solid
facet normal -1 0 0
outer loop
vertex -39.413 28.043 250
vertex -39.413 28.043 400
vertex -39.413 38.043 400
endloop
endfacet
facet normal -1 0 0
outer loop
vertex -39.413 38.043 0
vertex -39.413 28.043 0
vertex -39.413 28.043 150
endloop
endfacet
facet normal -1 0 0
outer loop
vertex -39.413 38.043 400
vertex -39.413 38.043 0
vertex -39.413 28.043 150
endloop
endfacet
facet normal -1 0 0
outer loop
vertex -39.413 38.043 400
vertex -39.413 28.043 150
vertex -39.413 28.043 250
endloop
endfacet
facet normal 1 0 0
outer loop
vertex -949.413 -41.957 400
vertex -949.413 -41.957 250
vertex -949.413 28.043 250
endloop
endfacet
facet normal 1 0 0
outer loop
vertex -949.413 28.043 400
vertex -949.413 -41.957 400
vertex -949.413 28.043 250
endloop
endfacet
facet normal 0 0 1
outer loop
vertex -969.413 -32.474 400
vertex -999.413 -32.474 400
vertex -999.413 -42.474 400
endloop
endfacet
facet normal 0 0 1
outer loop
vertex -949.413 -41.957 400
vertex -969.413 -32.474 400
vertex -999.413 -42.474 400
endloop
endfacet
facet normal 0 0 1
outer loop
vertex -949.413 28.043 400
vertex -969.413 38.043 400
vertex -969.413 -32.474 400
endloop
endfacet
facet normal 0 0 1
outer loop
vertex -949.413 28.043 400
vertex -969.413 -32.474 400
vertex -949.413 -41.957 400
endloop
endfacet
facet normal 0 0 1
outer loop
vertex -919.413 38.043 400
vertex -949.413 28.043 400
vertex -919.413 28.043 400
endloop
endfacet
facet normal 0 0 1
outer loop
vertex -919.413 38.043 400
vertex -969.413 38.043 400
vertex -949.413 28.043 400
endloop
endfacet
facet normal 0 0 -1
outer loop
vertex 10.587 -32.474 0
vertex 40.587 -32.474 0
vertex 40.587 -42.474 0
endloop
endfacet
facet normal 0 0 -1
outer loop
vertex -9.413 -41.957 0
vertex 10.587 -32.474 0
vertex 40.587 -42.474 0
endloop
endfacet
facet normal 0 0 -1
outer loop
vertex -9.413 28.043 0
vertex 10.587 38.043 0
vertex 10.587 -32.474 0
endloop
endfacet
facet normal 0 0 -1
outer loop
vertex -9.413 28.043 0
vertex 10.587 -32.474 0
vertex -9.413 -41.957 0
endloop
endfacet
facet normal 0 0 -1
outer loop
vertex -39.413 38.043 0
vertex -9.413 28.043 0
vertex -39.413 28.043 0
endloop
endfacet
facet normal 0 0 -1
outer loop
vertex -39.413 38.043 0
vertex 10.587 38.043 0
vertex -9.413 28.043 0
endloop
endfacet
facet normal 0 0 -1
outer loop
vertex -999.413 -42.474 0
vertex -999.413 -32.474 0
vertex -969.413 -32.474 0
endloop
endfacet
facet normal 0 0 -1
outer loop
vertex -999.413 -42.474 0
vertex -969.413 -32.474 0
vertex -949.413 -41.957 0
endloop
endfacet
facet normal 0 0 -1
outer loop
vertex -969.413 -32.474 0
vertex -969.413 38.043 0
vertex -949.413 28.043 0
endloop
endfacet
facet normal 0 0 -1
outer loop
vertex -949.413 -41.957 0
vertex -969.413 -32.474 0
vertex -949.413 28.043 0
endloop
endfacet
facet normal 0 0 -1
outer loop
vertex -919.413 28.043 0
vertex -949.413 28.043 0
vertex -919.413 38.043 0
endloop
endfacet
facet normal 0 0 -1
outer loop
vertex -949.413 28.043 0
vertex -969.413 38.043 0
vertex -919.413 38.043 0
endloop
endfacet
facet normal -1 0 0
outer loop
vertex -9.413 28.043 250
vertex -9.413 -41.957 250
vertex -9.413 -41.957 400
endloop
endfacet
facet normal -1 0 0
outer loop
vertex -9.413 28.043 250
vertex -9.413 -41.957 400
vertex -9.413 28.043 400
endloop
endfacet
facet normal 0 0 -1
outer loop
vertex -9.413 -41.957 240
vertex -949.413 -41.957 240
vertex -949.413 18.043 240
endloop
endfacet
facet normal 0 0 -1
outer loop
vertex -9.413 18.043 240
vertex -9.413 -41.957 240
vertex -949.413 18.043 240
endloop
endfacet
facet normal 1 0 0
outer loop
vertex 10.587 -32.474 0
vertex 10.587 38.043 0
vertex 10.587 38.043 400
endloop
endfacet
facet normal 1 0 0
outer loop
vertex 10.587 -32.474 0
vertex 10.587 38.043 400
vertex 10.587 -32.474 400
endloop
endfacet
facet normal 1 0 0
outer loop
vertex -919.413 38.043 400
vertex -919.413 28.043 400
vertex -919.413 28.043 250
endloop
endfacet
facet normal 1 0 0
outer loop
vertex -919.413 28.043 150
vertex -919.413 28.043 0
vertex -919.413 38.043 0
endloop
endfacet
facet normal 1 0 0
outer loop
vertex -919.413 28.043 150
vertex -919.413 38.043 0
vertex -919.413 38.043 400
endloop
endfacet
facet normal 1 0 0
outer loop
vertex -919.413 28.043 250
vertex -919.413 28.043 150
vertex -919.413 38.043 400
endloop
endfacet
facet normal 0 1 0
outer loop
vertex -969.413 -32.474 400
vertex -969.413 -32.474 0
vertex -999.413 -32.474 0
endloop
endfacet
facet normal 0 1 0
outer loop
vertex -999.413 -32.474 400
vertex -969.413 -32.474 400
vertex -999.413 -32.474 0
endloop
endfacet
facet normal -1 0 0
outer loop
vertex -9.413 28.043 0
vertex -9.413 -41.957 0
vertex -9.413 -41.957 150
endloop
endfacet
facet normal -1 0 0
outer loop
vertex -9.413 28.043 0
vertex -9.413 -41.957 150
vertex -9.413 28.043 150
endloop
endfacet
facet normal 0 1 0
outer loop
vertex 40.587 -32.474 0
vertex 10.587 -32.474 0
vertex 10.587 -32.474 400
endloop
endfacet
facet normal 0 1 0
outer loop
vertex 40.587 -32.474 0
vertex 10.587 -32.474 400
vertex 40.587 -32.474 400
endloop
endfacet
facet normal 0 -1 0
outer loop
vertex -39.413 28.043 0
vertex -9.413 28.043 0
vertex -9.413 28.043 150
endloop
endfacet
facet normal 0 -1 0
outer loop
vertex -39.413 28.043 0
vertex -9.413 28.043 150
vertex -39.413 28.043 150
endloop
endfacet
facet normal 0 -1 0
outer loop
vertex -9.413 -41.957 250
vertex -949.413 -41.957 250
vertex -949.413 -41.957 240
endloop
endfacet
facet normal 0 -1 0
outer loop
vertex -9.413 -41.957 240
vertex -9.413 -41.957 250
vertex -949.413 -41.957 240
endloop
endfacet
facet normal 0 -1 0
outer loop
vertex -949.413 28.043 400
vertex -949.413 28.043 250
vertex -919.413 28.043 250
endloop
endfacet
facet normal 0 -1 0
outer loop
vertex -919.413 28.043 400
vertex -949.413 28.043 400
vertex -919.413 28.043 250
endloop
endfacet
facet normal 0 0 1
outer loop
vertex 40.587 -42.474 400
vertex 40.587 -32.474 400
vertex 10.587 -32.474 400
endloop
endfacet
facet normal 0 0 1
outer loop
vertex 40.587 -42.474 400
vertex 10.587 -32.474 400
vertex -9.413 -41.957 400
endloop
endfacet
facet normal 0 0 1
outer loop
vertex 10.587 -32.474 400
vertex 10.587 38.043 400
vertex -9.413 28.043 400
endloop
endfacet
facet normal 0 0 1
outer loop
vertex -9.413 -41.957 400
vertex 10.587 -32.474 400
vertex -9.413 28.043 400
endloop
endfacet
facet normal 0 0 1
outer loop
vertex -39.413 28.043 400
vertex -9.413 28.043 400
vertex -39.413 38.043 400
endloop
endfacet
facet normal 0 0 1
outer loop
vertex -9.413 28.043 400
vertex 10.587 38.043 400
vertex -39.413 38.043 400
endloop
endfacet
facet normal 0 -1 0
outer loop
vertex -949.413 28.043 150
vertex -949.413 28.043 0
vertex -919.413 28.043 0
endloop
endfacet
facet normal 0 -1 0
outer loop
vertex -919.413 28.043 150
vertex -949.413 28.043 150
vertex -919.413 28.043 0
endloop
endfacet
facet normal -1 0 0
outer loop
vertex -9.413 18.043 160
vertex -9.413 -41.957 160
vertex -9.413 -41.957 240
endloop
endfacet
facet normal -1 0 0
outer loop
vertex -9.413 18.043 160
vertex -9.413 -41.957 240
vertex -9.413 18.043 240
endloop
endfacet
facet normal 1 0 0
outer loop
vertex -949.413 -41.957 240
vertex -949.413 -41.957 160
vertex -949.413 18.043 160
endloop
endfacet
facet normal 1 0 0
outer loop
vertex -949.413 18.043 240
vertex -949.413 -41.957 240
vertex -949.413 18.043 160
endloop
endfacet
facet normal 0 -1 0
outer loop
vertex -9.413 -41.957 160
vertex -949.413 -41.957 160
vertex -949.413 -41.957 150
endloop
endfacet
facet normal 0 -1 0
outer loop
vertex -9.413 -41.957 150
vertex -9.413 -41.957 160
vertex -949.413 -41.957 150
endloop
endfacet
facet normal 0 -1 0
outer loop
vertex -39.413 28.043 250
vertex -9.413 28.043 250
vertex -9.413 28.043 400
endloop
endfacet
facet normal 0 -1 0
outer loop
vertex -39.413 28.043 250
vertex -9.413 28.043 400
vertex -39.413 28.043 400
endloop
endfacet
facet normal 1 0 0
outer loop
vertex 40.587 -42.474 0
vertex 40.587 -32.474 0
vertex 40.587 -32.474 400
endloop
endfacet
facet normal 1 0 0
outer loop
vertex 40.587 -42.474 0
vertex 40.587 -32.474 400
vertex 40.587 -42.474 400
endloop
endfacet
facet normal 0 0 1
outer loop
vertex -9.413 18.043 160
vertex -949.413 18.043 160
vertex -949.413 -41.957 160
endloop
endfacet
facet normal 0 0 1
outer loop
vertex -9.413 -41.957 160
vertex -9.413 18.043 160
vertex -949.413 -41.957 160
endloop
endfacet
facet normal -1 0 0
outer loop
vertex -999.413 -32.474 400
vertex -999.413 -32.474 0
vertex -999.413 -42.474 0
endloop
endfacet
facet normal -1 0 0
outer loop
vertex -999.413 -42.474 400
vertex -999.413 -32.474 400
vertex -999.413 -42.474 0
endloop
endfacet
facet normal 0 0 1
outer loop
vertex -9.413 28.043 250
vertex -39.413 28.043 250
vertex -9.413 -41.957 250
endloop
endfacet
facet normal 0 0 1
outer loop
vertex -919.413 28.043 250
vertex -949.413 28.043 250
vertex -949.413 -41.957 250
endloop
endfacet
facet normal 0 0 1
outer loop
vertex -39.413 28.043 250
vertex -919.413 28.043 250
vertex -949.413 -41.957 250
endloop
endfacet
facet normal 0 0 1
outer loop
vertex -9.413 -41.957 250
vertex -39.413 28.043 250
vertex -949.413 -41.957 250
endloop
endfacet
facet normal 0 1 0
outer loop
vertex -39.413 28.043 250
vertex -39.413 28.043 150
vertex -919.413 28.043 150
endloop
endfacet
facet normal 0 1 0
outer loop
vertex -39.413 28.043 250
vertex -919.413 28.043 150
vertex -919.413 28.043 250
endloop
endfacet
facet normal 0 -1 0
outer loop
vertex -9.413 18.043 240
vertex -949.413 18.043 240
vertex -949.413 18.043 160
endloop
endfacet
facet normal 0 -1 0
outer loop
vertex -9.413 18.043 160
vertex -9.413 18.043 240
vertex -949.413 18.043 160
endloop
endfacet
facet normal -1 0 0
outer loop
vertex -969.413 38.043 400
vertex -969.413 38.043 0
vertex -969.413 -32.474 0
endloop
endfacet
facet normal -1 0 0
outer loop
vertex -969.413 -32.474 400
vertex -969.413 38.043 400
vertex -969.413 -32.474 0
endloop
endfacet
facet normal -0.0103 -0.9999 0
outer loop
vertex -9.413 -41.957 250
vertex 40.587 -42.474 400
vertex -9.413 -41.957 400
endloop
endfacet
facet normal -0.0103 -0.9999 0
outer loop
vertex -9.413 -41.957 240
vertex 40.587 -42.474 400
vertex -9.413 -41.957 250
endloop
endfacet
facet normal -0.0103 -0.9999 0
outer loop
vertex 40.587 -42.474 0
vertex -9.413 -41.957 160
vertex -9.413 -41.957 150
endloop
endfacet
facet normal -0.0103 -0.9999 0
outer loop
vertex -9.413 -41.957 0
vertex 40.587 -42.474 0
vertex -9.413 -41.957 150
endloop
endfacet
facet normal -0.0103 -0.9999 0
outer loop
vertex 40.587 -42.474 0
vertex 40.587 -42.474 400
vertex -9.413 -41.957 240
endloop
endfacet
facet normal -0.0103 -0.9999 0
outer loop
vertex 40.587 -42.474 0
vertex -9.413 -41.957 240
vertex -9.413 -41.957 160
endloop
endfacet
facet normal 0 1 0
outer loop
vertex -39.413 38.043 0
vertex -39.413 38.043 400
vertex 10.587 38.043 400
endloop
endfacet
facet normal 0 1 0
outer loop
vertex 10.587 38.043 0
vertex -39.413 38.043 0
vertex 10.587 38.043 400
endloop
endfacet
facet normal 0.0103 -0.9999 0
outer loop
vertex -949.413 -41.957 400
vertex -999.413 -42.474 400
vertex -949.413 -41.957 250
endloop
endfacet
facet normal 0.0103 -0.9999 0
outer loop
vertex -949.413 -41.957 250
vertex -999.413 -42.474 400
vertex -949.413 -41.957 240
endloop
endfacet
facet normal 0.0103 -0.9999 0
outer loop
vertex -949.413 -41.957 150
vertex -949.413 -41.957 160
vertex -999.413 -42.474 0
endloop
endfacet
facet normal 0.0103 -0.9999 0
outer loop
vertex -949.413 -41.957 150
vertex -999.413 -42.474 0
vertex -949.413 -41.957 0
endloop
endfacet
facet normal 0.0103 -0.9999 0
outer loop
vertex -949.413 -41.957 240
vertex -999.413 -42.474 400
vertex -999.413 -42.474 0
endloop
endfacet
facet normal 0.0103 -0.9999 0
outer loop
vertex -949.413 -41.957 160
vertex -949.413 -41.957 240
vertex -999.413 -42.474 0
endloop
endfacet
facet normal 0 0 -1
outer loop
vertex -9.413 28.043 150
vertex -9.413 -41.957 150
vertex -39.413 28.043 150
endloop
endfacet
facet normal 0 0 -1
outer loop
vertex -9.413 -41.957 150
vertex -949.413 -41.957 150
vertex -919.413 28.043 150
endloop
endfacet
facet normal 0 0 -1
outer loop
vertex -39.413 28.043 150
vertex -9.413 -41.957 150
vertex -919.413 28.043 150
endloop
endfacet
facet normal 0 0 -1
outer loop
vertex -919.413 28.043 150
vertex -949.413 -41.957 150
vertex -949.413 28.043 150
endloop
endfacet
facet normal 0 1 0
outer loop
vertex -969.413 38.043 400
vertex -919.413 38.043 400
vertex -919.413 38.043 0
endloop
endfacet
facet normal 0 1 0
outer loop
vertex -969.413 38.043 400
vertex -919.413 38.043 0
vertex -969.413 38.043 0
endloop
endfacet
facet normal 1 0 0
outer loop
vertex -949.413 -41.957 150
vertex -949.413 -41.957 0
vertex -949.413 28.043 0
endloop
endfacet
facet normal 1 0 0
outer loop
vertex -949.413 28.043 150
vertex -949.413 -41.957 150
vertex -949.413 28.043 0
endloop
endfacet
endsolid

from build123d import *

# Parameters (mm, degrees)
BOSS_EXTRUDE1_DEPTH = 400
BOSS_EXTRUDE2_DEPTH = 470


with BuildPart() as part:
    # Sketch1 → Boss-Extrude1 (new body)
    with BuildSketch(Plane.XY):
        Polygon((10.586659127, 38.043305377), (10.586659127, -32.473936002), (40.586659127, -32.473936002), (40.586659127, -42.473936002), (-9.413340873, -41.956694623), (-9.413340873, 28.043305377), (-39.413340873, 28.043305377), (-39.413340873, 38.043305377), align=None)
    boss_extrude1 = extrude(amount=BOSS_EXTRUDE1_DEPTH)

    # Sketch2 → Boss-Extrude2 (add)
    with BuildSketch(Plane.ZY.offset(9.413340873)):
        Polygon((150, 28.043305377), (250, 28.043305377), (250, -41.956694623), (240, -41.956694623), (240, 18.043305377), (160, 18.043305377), (160, -41.956694623), (150, -41.956694623), align=None)
    boss_extrude2 = extrude(amount=BOSS_EXTRUDE2_DEPTH)

    # Mirror2: Boss-Extrude2 across plane
    add(boss_extrude2.mirror(Plane.ZY.offset(479.413340873)))

    # Mirror3: Boss-Extrude1 across plane
    add(boss_extrude1.mirror(Plane.ZY.offset(479.413340873)))


solid = part.part
